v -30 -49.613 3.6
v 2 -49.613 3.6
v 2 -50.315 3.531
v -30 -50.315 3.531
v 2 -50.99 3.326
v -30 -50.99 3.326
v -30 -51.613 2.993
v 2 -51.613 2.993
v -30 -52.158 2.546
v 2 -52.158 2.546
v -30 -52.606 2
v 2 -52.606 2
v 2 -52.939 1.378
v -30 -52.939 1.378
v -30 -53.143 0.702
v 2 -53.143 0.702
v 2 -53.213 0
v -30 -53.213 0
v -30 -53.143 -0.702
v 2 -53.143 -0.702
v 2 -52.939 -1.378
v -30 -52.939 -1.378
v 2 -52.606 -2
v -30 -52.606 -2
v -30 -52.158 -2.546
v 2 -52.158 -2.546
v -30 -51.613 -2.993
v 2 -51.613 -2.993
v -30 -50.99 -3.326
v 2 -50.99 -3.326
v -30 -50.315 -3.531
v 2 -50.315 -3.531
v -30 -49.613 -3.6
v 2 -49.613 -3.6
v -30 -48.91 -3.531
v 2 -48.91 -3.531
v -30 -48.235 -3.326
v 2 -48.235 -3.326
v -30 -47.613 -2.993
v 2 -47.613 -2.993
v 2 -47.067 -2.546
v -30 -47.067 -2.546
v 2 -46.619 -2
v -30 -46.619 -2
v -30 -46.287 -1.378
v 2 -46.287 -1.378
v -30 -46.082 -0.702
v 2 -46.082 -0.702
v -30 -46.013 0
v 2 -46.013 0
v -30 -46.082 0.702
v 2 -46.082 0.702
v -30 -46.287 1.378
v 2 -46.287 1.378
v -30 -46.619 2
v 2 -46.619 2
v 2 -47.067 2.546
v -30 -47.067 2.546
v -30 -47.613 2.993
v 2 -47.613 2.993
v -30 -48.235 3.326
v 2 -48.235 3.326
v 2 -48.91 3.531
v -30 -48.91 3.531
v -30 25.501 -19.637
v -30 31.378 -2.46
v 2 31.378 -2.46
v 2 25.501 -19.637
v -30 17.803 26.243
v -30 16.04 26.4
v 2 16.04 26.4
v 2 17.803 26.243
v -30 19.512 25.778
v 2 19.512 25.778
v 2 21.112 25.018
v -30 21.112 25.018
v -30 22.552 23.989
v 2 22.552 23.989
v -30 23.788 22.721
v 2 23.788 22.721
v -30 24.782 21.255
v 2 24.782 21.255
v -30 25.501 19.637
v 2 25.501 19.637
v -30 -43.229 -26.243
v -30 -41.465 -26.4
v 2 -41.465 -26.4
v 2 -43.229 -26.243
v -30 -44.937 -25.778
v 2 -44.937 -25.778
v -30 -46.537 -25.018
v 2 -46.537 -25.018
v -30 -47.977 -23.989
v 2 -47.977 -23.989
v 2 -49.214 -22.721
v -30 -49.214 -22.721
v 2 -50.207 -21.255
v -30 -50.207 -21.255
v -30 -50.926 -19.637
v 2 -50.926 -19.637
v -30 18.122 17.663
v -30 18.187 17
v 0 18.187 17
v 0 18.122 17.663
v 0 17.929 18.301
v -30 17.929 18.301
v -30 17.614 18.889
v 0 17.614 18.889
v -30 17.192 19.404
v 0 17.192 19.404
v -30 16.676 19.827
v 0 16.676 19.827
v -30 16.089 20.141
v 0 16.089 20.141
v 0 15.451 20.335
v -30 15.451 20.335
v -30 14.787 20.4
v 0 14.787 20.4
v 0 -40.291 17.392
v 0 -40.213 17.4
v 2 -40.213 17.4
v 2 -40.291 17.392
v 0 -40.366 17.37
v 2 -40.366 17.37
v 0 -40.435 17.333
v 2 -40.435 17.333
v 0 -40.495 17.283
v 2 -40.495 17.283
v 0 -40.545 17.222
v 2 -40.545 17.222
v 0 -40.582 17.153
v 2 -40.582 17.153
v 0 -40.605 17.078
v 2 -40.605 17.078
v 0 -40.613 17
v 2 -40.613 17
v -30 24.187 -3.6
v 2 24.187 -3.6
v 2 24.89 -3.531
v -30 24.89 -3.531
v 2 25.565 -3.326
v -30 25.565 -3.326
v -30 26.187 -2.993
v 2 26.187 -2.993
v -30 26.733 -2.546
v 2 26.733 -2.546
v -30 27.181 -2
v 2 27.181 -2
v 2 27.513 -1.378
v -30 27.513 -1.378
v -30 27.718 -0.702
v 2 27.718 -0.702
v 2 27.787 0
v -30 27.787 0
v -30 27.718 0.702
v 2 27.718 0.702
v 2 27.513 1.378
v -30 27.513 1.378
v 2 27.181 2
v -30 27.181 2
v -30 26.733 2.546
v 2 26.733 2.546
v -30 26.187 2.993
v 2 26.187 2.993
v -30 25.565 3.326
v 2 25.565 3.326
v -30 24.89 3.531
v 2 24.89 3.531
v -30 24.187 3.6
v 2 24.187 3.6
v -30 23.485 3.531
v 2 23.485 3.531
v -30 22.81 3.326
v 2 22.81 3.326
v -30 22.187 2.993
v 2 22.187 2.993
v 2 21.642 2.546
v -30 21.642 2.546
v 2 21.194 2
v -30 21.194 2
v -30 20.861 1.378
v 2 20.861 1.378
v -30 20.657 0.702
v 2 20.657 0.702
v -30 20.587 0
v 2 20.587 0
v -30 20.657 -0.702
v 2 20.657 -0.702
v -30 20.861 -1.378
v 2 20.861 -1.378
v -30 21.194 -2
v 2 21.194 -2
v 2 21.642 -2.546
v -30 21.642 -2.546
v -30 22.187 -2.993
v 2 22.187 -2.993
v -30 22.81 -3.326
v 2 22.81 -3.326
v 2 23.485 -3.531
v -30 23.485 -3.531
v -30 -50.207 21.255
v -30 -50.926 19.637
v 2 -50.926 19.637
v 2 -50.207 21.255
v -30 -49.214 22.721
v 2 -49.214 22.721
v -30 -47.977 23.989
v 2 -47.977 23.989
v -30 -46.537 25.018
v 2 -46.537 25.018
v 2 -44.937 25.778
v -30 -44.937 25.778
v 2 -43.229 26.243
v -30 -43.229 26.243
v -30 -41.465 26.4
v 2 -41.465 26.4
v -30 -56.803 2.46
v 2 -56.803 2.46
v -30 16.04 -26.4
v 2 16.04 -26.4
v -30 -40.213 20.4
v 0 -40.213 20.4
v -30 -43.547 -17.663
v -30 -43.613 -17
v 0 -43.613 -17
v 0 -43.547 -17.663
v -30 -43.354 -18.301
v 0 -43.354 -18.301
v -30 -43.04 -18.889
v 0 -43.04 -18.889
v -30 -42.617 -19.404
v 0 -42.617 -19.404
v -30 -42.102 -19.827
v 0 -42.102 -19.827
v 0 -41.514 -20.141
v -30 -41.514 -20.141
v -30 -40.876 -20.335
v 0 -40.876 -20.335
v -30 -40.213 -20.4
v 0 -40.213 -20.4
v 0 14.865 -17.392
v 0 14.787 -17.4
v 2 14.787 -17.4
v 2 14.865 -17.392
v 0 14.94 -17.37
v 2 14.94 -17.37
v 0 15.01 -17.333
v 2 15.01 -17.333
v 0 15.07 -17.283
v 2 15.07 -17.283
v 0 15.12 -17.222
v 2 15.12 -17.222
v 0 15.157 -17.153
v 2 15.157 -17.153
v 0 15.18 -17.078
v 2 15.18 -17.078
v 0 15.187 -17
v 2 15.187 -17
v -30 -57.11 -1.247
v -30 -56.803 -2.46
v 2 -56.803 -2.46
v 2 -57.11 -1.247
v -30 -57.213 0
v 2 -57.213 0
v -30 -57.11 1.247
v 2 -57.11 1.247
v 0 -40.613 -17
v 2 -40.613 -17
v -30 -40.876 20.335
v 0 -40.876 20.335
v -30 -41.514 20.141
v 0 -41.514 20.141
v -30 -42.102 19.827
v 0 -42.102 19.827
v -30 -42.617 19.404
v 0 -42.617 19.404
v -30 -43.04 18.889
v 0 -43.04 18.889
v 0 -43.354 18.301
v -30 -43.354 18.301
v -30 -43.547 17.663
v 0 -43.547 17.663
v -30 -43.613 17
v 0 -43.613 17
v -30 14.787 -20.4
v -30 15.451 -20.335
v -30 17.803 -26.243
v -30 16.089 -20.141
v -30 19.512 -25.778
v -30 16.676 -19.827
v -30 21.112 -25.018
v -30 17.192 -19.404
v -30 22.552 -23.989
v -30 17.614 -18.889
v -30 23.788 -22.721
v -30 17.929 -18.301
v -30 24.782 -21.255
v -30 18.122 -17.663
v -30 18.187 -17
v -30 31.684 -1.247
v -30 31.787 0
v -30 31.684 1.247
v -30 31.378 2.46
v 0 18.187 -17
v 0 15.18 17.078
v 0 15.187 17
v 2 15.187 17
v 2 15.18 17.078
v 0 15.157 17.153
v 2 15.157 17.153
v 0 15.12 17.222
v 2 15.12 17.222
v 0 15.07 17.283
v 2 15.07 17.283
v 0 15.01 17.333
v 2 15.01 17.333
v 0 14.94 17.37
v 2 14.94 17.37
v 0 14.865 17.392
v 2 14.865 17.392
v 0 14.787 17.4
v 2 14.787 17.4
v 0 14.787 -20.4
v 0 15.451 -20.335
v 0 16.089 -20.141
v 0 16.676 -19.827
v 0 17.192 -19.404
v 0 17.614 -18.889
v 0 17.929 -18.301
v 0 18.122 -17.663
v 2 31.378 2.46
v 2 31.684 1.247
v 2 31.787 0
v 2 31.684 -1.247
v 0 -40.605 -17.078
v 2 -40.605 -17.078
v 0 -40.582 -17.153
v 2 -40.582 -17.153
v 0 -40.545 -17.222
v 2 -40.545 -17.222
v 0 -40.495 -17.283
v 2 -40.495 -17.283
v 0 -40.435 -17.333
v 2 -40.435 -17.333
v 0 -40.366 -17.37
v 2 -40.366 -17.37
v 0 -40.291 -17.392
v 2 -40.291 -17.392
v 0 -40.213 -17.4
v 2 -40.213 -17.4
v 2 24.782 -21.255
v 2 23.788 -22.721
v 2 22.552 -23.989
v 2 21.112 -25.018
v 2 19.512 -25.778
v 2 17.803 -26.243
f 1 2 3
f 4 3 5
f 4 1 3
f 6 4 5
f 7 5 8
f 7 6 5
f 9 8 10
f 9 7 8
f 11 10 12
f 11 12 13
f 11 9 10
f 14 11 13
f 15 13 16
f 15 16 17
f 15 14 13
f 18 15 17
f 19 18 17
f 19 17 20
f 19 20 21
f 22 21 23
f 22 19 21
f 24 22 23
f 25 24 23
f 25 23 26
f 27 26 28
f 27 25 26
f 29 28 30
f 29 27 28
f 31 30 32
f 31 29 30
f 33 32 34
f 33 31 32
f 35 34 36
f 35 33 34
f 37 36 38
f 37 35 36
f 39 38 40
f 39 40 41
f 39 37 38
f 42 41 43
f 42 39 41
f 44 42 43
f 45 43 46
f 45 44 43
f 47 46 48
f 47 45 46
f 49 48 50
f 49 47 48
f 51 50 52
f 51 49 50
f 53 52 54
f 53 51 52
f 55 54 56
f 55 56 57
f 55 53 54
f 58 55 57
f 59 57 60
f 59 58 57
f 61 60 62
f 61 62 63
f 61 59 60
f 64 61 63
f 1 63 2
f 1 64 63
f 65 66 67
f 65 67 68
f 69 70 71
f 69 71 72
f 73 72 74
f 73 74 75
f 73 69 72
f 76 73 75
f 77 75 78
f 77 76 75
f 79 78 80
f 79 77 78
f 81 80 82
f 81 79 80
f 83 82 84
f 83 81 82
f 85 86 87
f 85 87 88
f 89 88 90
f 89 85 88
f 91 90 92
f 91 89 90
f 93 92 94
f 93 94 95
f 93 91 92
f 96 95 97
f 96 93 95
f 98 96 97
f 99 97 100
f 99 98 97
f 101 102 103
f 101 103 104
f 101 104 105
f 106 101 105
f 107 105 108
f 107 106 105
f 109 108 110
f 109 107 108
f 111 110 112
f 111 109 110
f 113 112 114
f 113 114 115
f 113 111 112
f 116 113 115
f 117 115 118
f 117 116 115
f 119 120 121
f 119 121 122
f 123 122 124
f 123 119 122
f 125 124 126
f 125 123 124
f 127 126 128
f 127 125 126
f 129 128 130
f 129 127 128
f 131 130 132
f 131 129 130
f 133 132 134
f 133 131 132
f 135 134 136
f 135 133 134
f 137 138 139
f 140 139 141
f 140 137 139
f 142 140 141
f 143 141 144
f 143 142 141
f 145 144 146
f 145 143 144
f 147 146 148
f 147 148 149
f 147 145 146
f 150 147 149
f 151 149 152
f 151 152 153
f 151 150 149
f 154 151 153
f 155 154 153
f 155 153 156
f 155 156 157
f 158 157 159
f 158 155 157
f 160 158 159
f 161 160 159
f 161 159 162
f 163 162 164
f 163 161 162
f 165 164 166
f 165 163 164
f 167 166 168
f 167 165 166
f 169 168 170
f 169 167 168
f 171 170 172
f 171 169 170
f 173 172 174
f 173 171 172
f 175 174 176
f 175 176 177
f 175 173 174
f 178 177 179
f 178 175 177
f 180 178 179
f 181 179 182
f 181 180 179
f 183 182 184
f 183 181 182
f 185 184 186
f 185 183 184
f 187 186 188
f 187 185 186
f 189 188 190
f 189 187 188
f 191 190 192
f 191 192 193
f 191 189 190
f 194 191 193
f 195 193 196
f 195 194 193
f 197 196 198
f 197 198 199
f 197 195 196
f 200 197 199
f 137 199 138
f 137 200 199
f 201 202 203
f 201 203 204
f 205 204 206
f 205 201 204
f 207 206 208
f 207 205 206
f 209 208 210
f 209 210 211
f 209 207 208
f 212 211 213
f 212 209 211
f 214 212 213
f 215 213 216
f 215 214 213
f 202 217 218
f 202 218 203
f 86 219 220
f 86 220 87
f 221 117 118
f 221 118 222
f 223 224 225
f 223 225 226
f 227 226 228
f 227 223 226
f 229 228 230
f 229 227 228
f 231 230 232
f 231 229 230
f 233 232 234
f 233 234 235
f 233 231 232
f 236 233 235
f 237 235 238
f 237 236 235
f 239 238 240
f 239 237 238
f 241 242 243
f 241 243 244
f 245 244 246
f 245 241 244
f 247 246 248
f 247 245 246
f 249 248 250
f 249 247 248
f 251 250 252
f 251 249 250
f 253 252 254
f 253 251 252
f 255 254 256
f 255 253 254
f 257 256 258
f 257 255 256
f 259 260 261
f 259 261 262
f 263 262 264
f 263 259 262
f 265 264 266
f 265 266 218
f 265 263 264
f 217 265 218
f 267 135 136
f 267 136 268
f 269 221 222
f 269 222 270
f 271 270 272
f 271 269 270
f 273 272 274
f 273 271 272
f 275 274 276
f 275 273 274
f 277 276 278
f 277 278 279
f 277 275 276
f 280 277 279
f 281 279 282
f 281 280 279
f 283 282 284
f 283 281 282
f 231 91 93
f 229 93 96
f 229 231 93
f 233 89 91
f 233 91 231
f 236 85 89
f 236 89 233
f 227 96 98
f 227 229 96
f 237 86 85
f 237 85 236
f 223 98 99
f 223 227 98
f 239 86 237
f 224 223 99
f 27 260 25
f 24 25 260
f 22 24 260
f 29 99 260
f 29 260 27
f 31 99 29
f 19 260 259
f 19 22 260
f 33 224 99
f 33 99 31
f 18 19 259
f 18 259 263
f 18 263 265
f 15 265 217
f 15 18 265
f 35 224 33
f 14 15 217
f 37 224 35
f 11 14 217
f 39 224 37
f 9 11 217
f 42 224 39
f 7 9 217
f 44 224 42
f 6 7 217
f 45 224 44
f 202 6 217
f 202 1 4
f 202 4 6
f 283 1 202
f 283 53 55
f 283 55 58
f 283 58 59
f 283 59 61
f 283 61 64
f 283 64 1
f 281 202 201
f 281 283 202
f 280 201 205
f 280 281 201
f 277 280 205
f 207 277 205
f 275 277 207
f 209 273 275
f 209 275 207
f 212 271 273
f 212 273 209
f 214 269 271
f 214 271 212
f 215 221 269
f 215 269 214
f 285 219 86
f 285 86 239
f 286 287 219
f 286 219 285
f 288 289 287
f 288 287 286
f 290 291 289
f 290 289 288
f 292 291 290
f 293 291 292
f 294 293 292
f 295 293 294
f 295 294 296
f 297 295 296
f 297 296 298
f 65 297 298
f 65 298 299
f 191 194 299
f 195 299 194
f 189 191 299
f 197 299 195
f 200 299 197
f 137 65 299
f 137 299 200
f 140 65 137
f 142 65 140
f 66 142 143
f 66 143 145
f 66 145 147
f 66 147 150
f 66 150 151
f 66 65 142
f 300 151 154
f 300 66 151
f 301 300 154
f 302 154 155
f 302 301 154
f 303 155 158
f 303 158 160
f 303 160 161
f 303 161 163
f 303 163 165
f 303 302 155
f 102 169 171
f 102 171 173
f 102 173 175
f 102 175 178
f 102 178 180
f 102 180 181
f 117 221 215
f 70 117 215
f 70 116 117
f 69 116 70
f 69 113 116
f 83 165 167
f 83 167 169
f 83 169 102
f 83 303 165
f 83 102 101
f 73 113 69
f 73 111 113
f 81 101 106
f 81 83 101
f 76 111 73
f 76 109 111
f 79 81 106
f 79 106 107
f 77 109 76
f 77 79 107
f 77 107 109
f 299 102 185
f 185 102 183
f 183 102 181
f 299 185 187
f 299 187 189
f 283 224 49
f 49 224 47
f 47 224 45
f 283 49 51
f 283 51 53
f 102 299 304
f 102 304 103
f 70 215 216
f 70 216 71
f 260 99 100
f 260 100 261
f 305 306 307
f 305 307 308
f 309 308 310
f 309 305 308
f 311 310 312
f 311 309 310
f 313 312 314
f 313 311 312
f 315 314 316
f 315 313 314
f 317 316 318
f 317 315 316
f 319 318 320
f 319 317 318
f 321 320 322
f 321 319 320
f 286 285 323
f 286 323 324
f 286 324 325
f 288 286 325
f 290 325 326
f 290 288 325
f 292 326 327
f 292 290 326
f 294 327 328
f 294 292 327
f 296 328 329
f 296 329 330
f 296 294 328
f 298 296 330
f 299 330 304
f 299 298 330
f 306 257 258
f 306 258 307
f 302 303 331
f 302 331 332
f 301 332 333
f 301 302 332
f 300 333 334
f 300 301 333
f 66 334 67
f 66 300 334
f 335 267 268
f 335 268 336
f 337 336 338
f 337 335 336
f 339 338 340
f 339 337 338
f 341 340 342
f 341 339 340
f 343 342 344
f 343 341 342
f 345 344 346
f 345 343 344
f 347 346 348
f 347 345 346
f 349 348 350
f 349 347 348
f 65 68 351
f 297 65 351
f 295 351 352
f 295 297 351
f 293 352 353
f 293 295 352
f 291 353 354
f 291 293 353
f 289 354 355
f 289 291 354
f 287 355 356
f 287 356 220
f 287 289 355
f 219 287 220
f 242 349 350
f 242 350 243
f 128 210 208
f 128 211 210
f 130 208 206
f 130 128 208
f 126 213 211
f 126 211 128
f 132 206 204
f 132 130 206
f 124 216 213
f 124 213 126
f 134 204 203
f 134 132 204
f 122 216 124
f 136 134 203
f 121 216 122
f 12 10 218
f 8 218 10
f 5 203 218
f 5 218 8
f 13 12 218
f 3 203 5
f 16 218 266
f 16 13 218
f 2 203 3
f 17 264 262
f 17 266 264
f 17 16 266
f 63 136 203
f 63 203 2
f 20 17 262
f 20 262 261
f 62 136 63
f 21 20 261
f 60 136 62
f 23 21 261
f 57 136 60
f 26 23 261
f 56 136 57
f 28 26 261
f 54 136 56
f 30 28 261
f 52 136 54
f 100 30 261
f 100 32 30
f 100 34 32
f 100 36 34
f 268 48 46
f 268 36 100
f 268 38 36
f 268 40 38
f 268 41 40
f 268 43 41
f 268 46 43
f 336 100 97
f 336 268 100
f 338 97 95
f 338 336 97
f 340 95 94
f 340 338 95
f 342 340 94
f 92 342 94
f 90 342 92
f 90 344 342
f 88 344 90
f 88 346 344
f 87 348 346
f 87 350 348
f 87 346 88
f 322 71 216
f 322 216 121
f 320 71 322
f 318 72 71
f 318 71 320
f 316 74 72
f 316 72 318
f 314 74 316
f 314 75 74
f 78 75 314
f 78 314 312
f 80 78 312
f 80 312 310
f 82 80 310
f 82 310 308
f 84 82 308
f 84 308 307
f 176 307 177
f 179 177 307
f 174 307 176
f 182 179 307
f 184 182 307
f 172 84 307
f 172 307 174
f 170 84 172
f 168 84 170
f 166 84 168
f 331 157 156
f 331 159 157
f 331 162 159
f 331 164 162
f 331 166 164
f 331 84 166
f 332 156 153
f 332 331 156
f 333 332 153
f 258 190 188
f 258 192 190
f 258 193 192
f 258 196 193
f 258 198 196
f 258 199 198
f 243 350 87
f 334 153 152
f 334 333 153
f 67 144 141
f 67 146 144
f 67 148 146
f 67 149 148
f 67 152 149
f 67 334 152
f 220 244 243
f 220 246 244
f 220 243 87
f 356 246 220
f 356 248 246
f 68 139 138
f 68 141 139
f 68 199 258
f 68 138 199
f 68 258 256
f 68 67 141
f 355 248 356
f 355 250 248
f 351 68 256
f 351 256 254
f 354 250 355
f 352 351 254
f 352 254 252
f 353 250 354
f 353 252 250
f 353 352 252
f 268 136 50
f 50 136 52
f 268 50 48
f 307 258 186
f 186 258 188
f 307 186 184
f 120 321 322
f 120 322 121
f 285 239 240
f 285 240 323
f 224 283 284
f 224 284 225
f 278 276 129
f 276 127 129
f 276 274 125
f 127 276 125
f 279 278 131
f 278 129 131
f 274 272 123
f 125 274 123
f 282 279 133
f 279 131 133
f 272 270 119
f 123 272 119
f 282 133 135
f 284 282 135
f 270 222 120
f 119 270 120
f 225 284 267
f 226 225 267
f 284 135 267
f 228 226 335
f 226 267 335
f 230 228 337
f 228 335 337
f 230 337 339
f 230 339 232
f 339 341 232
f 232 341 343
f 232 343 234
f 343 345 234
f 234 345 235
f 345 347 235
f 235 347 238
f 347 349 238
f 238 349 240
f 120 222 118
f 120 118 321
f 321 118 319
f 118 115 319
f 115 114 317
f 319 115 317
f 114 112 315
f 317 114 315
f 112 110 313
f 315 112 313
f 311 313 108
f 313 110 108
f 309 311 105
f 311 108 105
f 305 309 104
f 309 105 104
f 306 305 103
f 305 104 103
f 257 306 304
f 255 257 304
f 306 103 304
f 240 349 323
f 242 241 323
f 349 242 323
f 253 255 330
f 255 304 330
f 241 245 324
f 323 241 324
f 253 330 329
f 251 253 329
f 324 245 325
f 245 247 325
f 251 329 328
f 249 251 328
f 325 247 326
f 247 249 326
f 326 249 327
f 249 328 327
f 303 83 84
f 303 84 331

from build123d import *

# Parameters (mm, degrees)
SALIENTE_EXTRUIR1_DEPTH      = 2
SALIENTE_EXTRUIR1_DEPTH_BACK = 30
CROQUIS2_R                   = 3.6
SALIENTE_EXTRUIR2_START      = -2
SALIENTE_EXTRUIR2_DEPTH      = 2


with BuildPart() as part:
    # Croquis2 → Saliente-Extruir1 (new, two sides: drawn at the far end of the back side and taken through both)
    with BuildSketch(Plane(origin=(0, 0, 0), x_dir=(0, 0, -1), z_dir=(1, 0, 0)).offset(-SALIENTE_EXTRUIR1_DEPTH_BACK)):
        with BuildLine():
            Line((-26.4, -41.464925013), (-26.4, 16.039678623))
            ThreePointArc((-26.4, 16.039678623), (-24.535471531, 21.85466813), (-19.637179406, 25.501214941))
            Line((-19.637179406, 25.501214941), (-2.460256349, 31.378144407))
            ThreePointArc((-2.460256349, 31.378144407), (0, 31.787376805), (2.460256349, 31.378144407))
            Line((2.460256349, 31.378144407), (19.637179406, 25.501214941))
            ThreePointArc((19.637179406, 25.501214941), (24.535471531, 21.85466813), (26.4, 16.039678623))
            Line((26.4, 16.039678623), (26.4, -41.464925013))
            ThreePointArc((26.4, -41.464925013), (24.535471531, -47.27991452), (19.637179406, -50.92646133))
            Line((19.637179406, -50.92646133), (2.460256349, -56.803390796))
            ThreePointArc((2.460256349, -56.803390796), (0, -57.212623195), (-2.460256349, -56.803390796))
            Line((-2.460256349, -56.803390796), (-19.637179406, -50.92646133))
            ThreePointArc((-19.637179406, -50.92646133), (-24.535471531, -47.27991452), (-26.4, -41.464925013))
        make_face()
        with Locations((0, 24.187376805)):
            Circle(CROQUIS2_R, mode=Mode.SUBTRACT)
        with Locations(Location((0, -49.612623195, 0), (0, 0, 180))):
            Circle(CROQUIS2_R, mode=Mode.SUBTRACT)
        with BuildLine():
            Line((20.4, -40.212623195), (20.4, 14.787376805))
            ThreePointArc((20.4, 14.787376805), (19.404163056, 17.191539861), (17, 18.187376805))
            Line((17, 18.187376805), (0, 18.187376805))
            Line((0, 18.187376805), (-17, 18.187376805))
            ThreePointArc((-17, 18.187376805), (-19.404163056, 17.191539861), (-20.4, 14.787376805))
            Line((-20.4, 14.787376805), (-20.4, -40.212623195))
            ThreePointArc((-20.4, -40.212623195), (-19.404163056, -42.616786251), (-17, -43.612623195))
            Line((-17, -43.612623195), (0, -43.612623195))
            Line((0, -43.612623195), (17, -43.612623195))
            ThreePointArc((17, -43.612623195), (19.404163056, -42.616786251), (20.4, -40.212623195))
        make_face(mode=Mode.SUBTRACT)
    extrude(amount=SALIENTE_EXTRUIR1_DEPTH + SALIENTE_EXTRUIR1_DEPTH_BACK)

    # Croquis3 → Saliente-Extruir2 (add)
    with BuildSketch(Plane(origin=(2, 0, 0), x_dir=(0, 0, -1), z_dir=(1, 0, 0)).offset(SALIENTE_EXTRUIR2_START)):
        with BuildLine():
            Line((-17, -43.612623195), (17, -43.612623195))
            ThreePointArc((17, -43.612623195), (19.404163056, -42.616786251), (20.4, -40.212623195))
            Line((20.4, -40.212623195), (20.4, 14.787376805))
            ThreePointArc((20.4, 14.787376805), (19.404163056, 17.191539861), (17, 18.187376805))
            Line((17, 18.187376805), (-17, 18.187376805))
            ThreePointArc((-17, 18.187376805), (-19.404163056, 17.191539861), (-20.4, 14.787376805))
            Line((-20.4, 14.787376805), (-20.4, -40.212623195))
            ThreePointArc((-20.4, -40.212623195), (-19.404163056, -42.616786251), (-17, -43.612623195))
        make_face()
        with BuildLine():
            Line((-17, -40.612623195), (17, -40.612623195))
            ThreePointArc((17, -40.612623195), (17.282842712, -40.495465907), (17.4, -40.212623195))
            Line((17.4, -40.212623195), (17.4, 14.787376805))
            ThreePointArc((17.4, 14.787376805), (17.282842712, 15.070219518), (17, 15.187376805))
            Line((17, 15.187376805), (-17, 15.187376805))
            ThreePointArc((-17, 15.187376805), (-17.282842712, 15.070219518), (-17.4, 14.787376805))
            Line((-17.4, 14.787376805), (-17.4, -40.212623195))
            ThreePointArc((-17.4, -40.212623195), (-17.282842712, -40.495465907), (-17, -40.612623195))
        make_face(mode=Mode.SUBTRACT)
    extrude(amount=SALIENTE_EXTRUIR2_DEPTH)


solid = part.part
